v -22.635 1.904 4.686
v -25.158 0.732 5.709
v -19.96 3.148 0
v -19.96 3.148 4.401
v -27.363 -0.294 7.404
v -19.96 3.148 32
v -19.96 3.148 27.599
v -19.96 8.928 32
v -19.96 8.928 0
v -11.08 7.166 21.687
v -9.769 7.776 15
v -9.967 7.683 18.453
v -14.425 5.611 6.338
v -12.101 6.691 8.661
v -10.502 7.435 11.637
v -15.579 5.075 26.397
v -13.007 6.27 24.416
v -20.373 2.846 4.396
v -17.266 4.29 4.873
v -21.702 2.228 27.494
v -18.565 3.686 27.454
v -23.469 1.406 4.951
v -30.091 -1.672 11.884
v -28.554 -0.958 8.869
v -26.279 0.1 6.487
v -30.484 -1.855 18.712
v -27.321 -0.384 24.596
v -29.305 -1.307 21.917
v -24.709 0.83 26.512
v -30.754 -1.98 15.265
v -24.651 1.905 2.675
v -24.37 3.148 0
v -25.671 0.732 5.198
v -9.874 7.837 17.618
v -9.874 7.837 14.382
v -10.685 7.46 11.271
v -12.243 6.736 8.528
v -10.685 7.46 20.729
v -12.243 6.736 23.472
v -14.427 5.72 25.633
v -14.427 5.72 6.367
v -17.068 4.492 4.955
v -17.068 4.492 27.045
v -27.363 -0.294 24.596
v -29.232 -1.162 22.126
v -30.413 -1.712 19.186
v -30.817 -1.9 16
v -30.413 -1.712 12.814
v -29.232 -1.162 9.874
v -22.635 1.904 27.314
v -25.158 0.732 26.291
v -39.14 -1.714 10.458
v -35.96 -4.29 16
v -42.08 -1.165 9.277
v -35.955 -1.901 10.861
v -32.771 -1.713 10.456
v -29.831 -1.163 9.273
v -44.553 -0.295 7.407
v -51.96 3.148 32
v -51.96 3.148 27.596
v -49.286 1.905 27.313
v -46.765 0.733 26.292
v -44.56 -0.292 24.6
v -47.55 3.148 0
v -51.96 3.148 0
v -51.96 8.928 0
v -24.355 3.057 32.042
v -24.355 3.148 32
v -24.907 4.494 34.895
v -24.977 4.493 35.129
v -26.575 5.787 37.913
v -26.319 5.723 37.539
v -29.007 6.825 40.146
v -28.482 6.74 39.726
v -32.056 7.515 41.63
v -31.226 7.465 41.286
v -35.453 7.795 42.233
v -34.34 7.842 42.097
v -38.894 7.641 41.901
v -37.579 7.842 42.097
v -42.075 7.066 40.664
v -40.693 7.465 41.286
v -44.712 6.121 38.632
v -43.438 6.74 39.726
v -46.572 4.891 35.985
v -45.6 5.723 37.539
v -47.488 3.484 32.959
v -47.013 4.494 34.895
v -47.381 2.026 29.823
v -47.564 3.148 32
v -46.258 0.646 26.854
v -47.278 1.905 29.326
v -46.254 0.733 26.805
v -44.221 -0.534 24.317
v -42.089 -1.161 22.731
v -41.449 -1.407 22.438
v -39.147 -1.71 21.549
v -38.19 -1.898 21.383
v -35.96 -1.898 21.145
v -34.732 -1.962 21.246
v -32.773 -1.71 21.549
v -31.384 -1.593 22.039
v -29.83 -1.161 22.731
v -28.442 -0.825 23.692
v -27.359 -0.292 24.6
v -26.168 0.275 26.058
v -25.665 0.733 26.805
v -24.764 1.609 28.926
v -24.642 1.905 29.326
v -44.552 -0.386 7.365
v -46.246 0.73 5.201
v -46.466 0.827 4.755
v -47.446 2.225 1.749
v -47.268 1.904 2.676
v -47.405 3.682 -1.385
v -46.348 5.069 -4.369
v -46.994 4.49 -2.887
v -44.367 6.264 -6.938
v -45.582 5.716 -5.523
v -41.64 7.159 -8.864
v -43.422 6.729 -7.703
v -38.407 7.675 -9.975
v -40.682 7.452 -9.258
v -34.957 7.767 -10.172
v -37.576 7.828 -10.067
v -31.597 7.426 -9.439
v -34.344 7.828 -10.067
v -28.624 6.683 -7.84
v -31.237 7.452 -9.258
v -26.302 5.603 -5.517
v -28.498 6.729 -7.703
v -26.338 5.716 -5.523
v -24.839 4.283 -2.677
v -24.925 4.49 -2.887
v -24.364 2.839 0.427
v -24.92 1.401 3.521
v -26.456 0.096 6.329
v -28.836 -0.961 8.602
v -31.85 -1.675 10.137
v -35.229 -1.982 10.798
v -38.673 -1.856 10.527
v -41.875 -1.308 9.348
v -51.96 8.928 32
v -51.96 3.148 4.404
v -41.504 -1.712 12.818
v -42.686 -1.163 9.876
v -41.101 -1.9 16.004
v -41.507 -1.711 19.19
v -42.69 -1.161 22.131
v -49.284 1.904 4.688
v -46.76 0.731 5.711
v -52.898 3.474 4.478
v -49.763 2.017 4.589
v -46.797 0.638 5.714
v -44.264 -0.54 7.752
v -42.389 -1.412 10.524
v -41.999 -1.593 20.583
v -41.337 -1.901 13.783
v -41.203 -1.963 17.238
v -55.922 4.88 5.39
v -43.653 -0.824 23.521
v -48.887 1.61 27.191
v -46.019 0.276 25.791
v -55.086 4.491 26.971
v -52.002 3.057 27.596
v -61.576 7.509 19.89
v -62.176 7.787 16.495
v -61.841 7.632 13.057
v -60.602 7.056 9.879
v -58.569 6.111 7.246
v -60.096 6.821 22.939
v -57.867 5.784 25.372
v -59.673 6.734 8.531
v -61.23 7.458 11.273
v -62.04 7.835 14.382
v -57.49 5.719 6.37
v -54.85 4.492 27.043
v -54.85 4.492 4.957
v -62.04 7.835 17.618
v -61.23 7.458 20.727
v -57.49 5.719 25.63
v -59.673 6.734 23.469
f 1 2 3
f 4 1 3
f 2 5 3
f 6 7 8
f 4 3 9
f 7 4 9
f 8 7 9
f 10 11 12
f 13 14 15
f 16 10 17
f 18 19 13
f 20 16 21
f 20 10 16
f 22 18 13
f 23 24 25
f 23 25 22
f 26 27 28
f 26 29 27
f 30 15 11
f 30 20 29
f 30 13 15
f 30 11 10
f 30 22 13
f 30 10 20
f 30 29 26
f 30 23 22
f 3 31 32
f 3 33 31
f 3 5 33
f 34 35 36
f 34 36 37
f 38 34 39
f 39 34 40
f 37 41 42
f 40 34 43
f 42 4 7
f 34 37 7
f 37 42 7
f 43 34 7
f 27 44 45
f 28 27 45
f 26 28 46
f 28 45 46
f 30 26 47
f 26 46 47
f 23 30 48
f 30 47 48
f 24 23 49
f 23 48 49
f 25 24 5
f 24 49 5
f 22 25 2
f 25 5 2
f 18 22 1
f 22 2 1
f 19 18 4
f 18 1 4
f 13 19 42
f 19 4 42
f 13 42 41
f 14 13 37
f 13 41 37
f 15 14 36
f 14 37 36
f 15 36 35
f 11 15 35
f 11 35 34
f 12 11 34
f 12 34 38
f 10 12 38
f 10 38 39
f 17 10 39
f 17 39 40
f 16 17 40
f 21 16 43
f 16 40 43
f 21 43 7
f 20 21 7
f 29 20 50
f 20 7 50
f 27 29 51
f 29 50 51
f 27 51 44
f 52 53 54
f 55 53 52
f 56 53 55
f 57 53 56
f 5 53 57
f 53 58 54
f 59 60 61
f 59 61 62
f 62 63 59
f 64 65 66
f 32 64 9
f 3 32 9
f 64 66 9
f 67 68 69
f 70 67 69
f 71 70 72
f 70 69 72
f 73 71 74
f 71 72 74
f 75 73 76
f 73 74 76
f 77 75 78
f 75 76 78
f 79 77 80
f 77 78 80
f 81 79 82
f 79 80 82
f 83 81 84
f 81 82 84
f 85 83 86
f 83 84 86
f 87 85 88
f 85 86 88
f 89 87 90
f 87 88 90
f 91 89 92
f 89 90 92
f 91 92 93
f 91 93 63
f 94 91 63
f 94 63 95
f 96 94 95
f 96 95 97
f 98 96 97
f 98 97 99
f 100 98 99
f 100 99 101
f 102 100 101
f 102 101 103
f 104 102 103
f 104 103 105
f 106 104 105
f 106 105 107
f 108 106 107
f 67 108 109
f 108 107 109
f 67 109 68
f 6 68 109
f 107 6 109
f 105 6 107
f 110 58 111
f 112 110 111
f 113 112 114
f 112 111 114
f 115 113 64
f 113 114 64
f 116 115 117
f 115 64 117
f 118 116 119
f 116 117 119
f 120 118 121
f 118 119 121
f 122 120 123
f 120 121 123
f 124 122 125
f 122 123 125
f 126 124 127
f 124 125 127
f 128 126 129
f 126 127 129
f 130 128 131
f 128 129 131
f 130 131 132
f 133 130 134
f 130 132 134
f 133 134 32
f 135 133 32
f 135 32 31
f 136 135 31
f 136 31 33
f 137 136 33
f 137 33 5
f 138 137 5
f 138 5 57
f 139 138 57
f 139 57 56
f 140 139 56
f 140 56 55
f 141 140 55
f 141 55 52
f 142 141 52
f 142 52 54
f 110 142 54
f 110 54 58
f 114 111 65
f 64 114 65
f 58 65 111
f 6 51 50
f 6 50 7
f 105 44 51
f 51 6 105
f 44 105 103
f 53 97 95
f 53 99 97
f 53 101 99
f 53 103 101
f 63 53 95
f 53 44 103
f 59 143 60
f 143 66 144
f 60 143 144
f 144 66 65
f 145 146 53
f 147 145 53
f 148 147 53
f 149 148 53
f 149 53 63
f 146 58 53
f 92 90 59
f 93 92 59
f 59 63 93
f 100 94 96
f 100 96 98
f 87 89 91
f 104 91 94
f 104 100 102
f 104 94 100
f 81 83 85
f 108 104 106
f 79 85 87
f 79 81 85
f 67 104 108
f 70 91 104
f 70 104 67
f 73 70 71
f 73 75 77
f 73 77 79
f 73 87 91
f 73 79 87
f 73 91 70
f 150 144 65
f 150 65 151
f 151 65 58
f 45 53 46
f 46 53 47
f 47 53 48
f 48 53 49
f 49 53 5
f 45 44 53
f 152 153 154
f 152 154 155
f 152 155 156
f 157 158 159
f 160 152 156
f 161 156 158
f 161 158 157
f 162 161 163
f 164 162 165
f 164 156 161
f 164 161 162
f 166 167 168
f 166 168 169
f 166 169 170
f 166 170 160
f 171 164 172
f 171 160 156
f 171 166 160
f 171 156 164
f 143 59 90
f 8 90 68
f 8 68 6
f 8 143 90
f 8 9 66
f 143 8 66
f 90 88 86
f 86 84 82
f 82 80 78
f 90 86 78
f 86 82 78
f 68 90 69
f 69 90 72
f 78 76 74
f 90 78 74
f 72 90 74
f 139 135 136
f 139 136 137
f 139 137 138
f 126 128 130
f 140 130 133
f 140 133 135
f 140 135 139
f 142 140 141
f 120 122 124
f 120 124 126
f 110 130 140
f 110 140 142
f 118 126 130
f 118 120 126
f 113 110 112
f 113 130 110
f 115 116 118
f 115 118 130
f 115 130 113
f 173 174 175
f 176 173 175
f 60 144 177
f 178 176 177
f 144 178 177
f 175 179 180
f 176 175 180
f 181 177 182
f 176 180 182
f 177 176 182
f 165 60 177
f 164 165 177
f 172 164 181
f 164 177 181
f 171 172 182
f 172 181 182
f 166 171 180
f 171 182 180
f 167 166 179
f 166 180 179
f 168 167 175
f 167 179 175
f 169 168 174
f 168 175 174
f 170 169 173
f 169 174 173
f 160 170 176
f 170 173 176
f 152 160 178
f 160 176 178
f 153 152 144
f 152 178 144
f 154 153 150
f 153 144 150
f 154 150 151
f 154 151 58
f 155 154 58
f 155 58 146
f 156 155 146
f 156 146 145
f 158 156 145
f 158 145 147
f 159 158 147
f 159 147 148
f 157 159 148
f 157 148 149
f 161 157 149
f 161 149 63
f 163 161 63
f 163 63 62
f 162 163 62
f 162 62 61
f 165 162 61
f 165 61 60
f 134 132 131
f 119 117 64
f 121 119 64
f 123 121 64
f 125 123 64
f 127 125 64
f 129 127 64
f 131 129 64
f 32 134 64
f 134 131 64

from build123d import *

# Parameters (mm, degrees)
SALIENTE_EXTRUIR1_DEPTH = 32
CORTAR_EXTRUIR1_DEPTH   = 33
CROQUIS3_R              = 11.604472628
SALIENTE_EXTRUIR2_DEPTH = 0.1
CROQUIS4_R              = 11.609993134
SALIENTE_EXTRUIR3_DEPTH = 0.1
CROQUIS6_R              = 11.602426911
SALIENTE_EXTRUIR4_DEPTH = 0.1
CROQUIS7_R              = 11.59621687
SALIENTE_EXTRUIR5_DEPTH = 0.1


with BuildPart() as part:
    # Croquis1 → Saliente-Extruir1 (new body)
    with BuildSketch(Plane.XY):
        Polygon((-51.959662641, 8.927829358), (-51.959662641, 3.148169014), (-35.959662641, -4.290206314), (-19.959662641, 3.148169014), (-19.959662641, 8.927829358), align=None)
    extrude(amount=SALIENTE_EXTRUIR1_DEPTH)

    # Croquis2 → Cortar-Extruir1 (cut)
    with BuildSketch(Plane(origin=(-19.959662641, 0, 0), x_dir=(0, 0, -1), z_dir=(1, 0, 0))):
        Polygon((0, -4.290206314), (-16, -4.290206314), (0, 3.148169014), align=None)
        Polygon((-32, -4.290206314), (-32, 3.148169014), (-16, -4.290206314), align=None)
    extrude(amount=-CORTAR_EXTRUIR1_DEPTH, mode=Mode.SUBTRACT)

    # Croquis3 → Saliente-Extruir2 (add)
    with BuildSketch(Plane(origin=(-4.750700642, 10.218791996, 0), x_dir=(-0.9067966272160485, -0.42156835373353035, 0), z_dir=(0.42156835373353035, -0.9067966272160485, 0))):
        with Locations(Location((17.141516117, -16, 0), (0, 0, 312.201634939))):
            Circle(CROQUIS3_R)
    extrude(amount=SALIENTE_EXTRUIR2_DEPTH)

    # Croquis4 → Saliente-Extruir3 (add)
    with BuildSketch(Plane(origin=(0, -9.644179557, 4.483564205), x_dir=(-1, 0, 0), z_dir=(0, -0.9067966272160485, 0.4215683537335304))):
        with Locations(Location((35.959662641, -29.983548914, 0), (0, 0, 181.782387553))):
            Circle(CROQUIS4_R)
    extrude(amount=SALIENTE_EXTRUIR3_DEPTH)

    # Croquis6 → Saliente-Extruir4 (add)
    with BuildSketch(Plane(origin=(-8.030792992, -17.274294748, 0), x_dir=(-0.9067966272160486, 0.4215683537335302, 0), z_dir=(-0.4215683537335302, -0.9067966272160486, 0))):
        with Locations(Location((48.071640088, -16, 0), (0, 0, 271.839200589))):
            Circle(CROQUIS6_R)
    extrude(amount=SALIENTE_EXTRUIR4_DEPTH)

    # Croquis7 → Saliente-Extruir5 (add)
    with BuildSketch(Plane(origin=(0, 2.588676805, 1.203471855), x_dir=(-1, 0, 0), z_dir=(0, -0.9067966272160485, -0.4215683537335304))):
        with Locations(Location((35.959662641, 0.945548569, 0), (0, 0, 317.815283521))):
            Circle(CROQUIS7_R)
    extrude(amount=SALIENTE_EXTRUIR5_DEPTH)


solid = part.part
